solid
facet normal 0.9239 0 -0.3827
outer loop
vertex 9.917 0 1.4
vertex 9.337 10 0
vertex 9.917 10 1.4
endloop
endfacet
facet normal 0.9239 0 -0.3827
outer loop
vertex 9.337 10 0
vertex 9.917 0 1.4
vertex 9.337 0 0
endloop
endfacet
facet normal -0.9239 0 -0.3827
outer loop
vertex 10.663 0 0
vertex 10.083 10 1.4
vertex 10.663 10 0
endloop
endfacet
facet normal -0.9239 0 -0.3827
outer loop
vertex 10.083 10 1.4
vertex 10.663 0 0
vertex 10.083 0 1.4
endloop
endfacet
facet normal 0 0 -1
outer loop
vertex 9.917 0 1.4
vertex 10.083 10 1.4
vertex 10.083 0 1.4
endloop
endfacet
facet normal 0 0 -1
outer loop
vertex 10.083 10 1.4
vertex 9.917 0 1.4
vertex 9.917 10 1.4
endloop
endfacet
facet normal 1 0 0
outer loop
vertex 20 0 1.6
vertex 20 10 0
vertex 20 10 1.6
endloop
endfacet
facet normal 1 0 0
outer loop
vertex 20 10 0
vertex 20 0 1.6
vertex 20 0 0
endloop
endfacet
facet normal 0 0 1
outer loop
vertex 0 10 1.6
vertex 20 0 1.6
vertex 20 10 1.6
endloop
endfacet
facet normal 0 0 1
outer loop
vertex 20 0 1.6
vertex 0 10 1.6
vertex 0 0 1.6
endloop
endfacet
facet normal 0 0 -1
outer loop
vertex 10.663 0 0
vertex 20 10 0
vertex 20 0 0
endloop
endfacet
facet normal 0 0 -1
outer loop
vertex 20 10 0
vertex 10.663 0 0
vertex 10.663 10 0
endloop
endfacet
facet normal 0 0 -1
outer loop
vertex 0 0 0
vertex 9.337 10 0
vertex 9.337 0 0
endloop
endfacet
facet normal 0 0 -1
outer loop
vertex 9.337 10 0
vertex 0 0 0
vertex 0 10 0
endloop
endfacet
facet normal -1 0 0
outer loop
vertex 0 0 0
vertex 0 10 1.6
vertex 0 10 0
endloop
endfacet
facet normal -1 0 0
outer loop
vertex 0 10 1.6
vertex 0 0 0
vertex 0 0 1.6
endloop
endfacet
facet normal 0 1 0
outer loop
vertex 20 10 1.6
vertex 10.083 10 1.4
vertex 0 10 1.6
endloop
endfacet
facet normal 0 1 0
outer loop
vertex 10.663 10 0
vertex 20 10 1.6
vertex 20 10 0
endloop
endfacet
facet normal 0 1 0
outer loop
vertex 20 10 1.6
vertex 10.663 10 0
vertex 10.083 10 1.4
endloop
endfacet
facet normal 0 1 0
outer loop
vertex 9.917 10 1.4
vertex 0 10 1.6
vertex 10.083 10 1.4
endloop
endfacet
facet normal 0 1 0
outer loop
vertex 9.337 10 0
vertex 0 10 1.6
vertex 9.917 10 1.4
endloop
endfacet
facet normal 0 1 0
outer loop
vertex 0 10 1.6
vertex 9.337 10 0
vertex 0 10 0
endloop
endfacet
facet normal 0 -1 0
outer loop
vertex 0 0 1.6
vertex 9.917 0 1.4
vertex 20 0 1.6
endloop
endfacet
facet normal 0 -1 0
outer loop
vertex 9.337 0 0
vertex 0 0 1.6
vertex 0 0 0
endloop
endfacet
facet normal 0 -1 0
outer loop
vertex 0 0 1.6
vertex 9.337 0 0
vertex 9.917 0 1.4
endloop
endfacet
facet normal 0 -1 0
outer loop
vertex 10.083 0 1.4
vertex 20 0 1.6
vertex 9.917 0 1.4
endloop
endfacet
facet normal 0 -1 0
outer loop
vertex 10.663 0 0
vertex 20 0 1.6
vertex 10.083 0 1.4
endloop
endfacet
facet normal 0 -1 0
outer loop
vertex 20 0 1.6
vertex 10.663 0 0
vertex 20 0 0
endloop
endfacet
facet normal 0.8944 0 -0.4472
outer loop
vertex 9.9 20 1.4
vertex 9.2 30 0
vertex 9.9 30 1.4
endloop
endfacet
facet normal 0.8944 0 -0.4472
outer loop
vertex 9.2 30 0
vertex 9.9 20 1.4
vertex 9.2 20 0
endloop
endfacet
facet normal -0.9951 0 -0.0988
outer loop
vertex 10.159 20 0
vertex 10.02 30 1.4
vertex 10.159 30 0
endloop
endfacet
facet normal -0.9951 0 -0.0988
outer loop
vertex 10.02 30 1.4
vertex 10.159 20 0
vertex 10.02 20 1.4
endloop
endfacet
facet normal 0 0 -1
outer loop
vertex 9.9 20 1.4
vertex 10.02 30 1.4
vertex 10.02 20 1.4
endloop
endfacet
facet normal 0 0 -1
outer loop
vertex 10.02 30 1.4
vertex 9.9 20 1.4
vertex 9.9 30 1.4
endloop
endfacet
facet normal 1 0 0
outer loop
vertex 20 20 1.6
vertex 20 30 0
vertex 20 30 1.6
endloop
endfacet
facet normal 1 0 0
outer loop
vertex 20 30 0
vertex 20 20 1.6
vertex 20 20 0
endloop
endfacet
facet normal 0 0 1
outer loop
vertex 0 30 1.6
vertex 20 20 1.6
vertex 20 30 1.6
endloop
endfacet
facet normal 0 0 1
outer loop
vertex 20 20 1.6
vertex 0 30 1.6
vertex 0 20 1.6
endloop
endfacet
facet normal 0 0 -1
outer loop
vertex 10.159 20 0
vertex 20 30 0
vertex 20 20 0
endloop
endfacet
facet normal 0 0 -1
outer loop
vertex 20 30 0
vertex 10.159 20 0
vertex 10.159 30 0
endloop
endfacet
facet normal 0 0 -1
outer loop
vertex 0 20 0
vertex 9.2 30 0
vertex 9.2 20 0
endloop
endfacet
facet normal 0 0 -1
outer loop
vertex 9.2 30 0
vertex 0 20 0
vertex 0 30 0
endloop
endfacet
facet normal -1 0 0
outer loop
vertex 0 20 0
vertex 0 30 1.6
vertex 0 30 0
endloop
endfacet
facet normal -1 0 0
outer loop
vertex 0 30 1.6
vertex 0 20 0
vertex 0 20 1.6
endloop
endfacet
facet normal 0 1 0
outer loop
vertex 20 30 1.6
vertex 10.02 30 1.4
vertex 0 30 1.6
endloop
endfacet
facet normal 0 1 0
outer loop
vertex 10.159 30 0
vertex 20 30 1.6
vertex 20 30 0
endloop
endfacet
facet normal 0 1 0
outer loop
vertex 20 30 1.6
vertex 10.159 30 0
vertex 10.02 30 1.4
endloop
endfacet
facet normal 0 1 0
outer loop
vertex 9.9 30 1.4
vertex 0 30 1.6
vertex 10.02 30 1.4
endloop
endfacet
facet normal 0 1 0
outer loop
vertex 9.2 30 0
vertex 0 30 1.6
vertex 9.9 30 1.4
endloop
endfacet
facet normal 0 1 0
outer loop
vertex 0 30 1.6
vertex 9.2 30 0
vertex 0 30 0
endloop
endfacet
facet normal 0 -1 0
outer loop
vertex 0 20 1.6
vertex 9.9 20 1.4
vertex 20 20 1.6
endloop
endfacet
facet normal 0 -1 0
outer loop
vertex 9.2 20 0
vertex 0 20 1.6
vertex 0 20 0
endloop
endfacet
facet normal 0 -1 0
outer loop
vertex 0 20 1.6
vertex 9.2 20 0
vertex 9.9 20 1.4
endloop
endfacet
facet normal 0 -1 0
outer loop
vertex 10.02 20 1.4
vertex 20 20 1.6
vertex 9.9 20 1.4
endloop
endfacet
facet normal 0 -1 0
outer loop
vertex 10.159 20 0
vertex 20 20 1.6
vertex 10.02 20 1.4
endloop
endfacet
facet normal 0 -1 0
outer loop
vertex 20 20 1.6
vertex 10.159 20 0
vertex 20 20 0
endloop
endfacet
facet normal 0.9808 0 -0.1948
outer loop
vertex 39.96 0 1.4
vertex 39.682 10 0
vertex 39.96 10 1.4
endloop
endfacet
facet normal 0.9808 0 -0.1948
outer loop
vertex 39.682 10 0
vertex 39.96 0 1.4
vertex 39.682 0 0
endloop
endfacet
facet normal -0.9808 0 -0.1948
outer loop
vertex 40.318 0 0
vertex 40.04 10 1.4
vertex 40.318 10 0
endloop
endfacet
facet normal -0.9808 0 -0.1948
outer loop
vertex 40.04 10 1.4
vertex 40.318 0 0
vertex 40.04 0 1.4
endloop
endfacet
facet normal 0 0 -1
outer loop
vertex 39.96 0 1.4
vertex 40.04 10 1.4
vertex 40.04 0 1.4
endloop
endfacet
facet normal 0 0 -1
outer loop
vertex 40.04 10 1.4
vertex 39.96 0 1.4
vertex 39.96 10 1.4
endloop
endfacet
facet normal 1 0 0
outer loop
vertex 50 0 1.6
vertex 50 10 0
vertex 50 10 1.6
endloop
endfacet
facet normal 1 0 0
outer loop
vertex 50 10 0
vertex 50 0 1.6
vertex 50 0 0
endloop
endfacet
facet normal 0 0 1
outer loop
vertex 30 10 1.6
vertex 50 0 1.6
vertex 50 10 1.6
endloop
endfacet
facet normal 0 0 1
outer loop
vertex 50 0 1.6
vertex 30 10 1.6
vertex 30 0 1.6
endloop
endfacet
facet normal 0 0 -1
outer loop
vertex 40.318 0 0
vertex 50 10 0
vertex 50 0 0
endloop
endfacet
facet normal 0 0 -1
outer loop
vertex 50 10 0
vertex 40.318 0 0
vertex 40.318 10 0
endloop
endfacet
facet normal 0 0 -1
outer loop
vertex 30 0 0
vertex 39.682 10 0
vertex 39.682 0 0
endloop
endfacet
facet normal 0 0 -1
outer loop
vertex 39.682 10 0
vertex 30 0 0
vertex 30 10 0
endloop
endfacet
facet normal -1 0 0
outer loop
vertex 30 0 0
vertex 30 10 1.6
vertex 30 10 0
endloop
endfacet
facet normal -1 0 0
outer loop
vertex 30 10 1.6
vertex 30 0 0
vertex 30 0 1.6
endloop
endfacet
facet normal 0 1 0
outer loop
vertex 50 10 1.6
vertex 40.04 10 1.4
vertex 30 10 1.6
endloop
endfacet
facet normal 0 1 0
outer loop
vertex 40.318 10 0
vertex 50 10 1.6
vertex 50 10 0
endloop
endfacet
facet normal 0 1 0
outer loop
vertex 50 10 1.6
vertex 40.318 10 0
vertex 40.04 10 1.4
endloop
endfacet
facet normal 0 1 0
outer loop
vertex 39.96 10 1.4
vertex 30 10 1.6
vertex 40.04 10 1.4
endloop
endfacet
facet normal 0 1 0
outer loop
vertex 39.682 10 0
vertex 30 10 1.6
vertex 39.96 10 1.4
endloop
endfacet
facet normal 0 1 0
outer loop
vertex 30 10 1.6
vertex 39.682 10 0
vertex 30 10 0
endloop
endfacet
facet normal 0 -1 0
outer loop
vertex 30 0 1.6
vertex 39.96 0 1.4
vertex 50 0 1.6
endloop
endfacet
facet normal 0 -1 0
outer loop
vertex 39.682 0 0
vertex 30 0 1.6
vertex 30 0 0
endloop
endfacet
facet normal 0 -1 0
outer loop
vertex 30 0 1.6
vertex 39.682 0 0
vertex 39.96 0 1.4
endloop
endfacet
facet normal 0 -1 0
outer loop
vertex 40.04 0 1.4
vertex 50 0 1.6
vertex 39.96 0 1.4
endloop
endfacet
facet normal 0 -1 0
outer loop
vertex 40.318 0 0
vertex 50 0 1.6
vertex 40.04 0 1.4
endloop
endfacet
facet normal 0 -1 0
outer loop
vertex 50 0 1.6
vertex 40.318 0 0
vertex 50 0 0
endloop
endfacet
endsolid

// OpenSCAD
/* Cuts a bend under the kit card */

module bend_cut(sides, length, thickness = 1.6) {
  // Make it thicker to avoid edge collisions
  angle = (360 / sides);
  h = thickness;
  w = 2 * h * tan(angle / 2);

  translate([0, 0, -3*h]) rotate([0, 90, 0]) rotate([0, 0, 90]) {
    difference() {
      linear_extrude(length) {
        polygon([
          [-2*w, 0],
          [0, 4*h],
          [2*w, 0]
        ]);
      }

      translate([-2*w, 4*h - 0.2, -1]) cube([4*w, 4*h, length + 2]);
    }
  }
}

// When rotated anticlockwise about the Z axis, sides_left will calculate the left angle.
module transition_bend_cut(sides_left, sides_right, length, thickness = 1.6) {
  angle_l = 360 / sides_left / 2;
  angle_r = 360 / sides_right / 2;
  h = thickness;
  w_l = h * tan(angle_l);
  w_r = h * tan(angle_r);

  translate([0, 0, -h]) rotate([0, 90, 0]) rotate([0, 0, 90]) {
    difference() {
      linear_extrude(length) {
        polygon([
          [-w_r, 0],
          [0, 2*h],
          [w_l, 0]
        ]);
      } 

      translate([-w_r, 2*h - 0.2, -1]) cube([w_r + w_l, h, length + 2]);
    }
  }
}

module test_bend() {
  difference() {
    cube([20, 10, 1.6]);
    translate([10, -5, 0]) rotate([0, 0, 90]) bend_cut(8, 30);
  }
}

module test_bend_narrow() {
  difference() {
    cube([20, 10, 1.6]);
    translate([10, -5, 0]) rotate([0, 0, 90]) bend_cut(16, 30);
  }
}

module test_transition_bend() {
  difference() {
    cube([20, 10, 1.6]);
    translate([10, -5, 0]) rotate([0, 0, 90]) transition_bend_cut(4, 16, 30);
  }
}

test_bend();
translate([0, 20, 0]) test_transition_bend();

translate([30, 0, 0]) test_bend_narrow();
